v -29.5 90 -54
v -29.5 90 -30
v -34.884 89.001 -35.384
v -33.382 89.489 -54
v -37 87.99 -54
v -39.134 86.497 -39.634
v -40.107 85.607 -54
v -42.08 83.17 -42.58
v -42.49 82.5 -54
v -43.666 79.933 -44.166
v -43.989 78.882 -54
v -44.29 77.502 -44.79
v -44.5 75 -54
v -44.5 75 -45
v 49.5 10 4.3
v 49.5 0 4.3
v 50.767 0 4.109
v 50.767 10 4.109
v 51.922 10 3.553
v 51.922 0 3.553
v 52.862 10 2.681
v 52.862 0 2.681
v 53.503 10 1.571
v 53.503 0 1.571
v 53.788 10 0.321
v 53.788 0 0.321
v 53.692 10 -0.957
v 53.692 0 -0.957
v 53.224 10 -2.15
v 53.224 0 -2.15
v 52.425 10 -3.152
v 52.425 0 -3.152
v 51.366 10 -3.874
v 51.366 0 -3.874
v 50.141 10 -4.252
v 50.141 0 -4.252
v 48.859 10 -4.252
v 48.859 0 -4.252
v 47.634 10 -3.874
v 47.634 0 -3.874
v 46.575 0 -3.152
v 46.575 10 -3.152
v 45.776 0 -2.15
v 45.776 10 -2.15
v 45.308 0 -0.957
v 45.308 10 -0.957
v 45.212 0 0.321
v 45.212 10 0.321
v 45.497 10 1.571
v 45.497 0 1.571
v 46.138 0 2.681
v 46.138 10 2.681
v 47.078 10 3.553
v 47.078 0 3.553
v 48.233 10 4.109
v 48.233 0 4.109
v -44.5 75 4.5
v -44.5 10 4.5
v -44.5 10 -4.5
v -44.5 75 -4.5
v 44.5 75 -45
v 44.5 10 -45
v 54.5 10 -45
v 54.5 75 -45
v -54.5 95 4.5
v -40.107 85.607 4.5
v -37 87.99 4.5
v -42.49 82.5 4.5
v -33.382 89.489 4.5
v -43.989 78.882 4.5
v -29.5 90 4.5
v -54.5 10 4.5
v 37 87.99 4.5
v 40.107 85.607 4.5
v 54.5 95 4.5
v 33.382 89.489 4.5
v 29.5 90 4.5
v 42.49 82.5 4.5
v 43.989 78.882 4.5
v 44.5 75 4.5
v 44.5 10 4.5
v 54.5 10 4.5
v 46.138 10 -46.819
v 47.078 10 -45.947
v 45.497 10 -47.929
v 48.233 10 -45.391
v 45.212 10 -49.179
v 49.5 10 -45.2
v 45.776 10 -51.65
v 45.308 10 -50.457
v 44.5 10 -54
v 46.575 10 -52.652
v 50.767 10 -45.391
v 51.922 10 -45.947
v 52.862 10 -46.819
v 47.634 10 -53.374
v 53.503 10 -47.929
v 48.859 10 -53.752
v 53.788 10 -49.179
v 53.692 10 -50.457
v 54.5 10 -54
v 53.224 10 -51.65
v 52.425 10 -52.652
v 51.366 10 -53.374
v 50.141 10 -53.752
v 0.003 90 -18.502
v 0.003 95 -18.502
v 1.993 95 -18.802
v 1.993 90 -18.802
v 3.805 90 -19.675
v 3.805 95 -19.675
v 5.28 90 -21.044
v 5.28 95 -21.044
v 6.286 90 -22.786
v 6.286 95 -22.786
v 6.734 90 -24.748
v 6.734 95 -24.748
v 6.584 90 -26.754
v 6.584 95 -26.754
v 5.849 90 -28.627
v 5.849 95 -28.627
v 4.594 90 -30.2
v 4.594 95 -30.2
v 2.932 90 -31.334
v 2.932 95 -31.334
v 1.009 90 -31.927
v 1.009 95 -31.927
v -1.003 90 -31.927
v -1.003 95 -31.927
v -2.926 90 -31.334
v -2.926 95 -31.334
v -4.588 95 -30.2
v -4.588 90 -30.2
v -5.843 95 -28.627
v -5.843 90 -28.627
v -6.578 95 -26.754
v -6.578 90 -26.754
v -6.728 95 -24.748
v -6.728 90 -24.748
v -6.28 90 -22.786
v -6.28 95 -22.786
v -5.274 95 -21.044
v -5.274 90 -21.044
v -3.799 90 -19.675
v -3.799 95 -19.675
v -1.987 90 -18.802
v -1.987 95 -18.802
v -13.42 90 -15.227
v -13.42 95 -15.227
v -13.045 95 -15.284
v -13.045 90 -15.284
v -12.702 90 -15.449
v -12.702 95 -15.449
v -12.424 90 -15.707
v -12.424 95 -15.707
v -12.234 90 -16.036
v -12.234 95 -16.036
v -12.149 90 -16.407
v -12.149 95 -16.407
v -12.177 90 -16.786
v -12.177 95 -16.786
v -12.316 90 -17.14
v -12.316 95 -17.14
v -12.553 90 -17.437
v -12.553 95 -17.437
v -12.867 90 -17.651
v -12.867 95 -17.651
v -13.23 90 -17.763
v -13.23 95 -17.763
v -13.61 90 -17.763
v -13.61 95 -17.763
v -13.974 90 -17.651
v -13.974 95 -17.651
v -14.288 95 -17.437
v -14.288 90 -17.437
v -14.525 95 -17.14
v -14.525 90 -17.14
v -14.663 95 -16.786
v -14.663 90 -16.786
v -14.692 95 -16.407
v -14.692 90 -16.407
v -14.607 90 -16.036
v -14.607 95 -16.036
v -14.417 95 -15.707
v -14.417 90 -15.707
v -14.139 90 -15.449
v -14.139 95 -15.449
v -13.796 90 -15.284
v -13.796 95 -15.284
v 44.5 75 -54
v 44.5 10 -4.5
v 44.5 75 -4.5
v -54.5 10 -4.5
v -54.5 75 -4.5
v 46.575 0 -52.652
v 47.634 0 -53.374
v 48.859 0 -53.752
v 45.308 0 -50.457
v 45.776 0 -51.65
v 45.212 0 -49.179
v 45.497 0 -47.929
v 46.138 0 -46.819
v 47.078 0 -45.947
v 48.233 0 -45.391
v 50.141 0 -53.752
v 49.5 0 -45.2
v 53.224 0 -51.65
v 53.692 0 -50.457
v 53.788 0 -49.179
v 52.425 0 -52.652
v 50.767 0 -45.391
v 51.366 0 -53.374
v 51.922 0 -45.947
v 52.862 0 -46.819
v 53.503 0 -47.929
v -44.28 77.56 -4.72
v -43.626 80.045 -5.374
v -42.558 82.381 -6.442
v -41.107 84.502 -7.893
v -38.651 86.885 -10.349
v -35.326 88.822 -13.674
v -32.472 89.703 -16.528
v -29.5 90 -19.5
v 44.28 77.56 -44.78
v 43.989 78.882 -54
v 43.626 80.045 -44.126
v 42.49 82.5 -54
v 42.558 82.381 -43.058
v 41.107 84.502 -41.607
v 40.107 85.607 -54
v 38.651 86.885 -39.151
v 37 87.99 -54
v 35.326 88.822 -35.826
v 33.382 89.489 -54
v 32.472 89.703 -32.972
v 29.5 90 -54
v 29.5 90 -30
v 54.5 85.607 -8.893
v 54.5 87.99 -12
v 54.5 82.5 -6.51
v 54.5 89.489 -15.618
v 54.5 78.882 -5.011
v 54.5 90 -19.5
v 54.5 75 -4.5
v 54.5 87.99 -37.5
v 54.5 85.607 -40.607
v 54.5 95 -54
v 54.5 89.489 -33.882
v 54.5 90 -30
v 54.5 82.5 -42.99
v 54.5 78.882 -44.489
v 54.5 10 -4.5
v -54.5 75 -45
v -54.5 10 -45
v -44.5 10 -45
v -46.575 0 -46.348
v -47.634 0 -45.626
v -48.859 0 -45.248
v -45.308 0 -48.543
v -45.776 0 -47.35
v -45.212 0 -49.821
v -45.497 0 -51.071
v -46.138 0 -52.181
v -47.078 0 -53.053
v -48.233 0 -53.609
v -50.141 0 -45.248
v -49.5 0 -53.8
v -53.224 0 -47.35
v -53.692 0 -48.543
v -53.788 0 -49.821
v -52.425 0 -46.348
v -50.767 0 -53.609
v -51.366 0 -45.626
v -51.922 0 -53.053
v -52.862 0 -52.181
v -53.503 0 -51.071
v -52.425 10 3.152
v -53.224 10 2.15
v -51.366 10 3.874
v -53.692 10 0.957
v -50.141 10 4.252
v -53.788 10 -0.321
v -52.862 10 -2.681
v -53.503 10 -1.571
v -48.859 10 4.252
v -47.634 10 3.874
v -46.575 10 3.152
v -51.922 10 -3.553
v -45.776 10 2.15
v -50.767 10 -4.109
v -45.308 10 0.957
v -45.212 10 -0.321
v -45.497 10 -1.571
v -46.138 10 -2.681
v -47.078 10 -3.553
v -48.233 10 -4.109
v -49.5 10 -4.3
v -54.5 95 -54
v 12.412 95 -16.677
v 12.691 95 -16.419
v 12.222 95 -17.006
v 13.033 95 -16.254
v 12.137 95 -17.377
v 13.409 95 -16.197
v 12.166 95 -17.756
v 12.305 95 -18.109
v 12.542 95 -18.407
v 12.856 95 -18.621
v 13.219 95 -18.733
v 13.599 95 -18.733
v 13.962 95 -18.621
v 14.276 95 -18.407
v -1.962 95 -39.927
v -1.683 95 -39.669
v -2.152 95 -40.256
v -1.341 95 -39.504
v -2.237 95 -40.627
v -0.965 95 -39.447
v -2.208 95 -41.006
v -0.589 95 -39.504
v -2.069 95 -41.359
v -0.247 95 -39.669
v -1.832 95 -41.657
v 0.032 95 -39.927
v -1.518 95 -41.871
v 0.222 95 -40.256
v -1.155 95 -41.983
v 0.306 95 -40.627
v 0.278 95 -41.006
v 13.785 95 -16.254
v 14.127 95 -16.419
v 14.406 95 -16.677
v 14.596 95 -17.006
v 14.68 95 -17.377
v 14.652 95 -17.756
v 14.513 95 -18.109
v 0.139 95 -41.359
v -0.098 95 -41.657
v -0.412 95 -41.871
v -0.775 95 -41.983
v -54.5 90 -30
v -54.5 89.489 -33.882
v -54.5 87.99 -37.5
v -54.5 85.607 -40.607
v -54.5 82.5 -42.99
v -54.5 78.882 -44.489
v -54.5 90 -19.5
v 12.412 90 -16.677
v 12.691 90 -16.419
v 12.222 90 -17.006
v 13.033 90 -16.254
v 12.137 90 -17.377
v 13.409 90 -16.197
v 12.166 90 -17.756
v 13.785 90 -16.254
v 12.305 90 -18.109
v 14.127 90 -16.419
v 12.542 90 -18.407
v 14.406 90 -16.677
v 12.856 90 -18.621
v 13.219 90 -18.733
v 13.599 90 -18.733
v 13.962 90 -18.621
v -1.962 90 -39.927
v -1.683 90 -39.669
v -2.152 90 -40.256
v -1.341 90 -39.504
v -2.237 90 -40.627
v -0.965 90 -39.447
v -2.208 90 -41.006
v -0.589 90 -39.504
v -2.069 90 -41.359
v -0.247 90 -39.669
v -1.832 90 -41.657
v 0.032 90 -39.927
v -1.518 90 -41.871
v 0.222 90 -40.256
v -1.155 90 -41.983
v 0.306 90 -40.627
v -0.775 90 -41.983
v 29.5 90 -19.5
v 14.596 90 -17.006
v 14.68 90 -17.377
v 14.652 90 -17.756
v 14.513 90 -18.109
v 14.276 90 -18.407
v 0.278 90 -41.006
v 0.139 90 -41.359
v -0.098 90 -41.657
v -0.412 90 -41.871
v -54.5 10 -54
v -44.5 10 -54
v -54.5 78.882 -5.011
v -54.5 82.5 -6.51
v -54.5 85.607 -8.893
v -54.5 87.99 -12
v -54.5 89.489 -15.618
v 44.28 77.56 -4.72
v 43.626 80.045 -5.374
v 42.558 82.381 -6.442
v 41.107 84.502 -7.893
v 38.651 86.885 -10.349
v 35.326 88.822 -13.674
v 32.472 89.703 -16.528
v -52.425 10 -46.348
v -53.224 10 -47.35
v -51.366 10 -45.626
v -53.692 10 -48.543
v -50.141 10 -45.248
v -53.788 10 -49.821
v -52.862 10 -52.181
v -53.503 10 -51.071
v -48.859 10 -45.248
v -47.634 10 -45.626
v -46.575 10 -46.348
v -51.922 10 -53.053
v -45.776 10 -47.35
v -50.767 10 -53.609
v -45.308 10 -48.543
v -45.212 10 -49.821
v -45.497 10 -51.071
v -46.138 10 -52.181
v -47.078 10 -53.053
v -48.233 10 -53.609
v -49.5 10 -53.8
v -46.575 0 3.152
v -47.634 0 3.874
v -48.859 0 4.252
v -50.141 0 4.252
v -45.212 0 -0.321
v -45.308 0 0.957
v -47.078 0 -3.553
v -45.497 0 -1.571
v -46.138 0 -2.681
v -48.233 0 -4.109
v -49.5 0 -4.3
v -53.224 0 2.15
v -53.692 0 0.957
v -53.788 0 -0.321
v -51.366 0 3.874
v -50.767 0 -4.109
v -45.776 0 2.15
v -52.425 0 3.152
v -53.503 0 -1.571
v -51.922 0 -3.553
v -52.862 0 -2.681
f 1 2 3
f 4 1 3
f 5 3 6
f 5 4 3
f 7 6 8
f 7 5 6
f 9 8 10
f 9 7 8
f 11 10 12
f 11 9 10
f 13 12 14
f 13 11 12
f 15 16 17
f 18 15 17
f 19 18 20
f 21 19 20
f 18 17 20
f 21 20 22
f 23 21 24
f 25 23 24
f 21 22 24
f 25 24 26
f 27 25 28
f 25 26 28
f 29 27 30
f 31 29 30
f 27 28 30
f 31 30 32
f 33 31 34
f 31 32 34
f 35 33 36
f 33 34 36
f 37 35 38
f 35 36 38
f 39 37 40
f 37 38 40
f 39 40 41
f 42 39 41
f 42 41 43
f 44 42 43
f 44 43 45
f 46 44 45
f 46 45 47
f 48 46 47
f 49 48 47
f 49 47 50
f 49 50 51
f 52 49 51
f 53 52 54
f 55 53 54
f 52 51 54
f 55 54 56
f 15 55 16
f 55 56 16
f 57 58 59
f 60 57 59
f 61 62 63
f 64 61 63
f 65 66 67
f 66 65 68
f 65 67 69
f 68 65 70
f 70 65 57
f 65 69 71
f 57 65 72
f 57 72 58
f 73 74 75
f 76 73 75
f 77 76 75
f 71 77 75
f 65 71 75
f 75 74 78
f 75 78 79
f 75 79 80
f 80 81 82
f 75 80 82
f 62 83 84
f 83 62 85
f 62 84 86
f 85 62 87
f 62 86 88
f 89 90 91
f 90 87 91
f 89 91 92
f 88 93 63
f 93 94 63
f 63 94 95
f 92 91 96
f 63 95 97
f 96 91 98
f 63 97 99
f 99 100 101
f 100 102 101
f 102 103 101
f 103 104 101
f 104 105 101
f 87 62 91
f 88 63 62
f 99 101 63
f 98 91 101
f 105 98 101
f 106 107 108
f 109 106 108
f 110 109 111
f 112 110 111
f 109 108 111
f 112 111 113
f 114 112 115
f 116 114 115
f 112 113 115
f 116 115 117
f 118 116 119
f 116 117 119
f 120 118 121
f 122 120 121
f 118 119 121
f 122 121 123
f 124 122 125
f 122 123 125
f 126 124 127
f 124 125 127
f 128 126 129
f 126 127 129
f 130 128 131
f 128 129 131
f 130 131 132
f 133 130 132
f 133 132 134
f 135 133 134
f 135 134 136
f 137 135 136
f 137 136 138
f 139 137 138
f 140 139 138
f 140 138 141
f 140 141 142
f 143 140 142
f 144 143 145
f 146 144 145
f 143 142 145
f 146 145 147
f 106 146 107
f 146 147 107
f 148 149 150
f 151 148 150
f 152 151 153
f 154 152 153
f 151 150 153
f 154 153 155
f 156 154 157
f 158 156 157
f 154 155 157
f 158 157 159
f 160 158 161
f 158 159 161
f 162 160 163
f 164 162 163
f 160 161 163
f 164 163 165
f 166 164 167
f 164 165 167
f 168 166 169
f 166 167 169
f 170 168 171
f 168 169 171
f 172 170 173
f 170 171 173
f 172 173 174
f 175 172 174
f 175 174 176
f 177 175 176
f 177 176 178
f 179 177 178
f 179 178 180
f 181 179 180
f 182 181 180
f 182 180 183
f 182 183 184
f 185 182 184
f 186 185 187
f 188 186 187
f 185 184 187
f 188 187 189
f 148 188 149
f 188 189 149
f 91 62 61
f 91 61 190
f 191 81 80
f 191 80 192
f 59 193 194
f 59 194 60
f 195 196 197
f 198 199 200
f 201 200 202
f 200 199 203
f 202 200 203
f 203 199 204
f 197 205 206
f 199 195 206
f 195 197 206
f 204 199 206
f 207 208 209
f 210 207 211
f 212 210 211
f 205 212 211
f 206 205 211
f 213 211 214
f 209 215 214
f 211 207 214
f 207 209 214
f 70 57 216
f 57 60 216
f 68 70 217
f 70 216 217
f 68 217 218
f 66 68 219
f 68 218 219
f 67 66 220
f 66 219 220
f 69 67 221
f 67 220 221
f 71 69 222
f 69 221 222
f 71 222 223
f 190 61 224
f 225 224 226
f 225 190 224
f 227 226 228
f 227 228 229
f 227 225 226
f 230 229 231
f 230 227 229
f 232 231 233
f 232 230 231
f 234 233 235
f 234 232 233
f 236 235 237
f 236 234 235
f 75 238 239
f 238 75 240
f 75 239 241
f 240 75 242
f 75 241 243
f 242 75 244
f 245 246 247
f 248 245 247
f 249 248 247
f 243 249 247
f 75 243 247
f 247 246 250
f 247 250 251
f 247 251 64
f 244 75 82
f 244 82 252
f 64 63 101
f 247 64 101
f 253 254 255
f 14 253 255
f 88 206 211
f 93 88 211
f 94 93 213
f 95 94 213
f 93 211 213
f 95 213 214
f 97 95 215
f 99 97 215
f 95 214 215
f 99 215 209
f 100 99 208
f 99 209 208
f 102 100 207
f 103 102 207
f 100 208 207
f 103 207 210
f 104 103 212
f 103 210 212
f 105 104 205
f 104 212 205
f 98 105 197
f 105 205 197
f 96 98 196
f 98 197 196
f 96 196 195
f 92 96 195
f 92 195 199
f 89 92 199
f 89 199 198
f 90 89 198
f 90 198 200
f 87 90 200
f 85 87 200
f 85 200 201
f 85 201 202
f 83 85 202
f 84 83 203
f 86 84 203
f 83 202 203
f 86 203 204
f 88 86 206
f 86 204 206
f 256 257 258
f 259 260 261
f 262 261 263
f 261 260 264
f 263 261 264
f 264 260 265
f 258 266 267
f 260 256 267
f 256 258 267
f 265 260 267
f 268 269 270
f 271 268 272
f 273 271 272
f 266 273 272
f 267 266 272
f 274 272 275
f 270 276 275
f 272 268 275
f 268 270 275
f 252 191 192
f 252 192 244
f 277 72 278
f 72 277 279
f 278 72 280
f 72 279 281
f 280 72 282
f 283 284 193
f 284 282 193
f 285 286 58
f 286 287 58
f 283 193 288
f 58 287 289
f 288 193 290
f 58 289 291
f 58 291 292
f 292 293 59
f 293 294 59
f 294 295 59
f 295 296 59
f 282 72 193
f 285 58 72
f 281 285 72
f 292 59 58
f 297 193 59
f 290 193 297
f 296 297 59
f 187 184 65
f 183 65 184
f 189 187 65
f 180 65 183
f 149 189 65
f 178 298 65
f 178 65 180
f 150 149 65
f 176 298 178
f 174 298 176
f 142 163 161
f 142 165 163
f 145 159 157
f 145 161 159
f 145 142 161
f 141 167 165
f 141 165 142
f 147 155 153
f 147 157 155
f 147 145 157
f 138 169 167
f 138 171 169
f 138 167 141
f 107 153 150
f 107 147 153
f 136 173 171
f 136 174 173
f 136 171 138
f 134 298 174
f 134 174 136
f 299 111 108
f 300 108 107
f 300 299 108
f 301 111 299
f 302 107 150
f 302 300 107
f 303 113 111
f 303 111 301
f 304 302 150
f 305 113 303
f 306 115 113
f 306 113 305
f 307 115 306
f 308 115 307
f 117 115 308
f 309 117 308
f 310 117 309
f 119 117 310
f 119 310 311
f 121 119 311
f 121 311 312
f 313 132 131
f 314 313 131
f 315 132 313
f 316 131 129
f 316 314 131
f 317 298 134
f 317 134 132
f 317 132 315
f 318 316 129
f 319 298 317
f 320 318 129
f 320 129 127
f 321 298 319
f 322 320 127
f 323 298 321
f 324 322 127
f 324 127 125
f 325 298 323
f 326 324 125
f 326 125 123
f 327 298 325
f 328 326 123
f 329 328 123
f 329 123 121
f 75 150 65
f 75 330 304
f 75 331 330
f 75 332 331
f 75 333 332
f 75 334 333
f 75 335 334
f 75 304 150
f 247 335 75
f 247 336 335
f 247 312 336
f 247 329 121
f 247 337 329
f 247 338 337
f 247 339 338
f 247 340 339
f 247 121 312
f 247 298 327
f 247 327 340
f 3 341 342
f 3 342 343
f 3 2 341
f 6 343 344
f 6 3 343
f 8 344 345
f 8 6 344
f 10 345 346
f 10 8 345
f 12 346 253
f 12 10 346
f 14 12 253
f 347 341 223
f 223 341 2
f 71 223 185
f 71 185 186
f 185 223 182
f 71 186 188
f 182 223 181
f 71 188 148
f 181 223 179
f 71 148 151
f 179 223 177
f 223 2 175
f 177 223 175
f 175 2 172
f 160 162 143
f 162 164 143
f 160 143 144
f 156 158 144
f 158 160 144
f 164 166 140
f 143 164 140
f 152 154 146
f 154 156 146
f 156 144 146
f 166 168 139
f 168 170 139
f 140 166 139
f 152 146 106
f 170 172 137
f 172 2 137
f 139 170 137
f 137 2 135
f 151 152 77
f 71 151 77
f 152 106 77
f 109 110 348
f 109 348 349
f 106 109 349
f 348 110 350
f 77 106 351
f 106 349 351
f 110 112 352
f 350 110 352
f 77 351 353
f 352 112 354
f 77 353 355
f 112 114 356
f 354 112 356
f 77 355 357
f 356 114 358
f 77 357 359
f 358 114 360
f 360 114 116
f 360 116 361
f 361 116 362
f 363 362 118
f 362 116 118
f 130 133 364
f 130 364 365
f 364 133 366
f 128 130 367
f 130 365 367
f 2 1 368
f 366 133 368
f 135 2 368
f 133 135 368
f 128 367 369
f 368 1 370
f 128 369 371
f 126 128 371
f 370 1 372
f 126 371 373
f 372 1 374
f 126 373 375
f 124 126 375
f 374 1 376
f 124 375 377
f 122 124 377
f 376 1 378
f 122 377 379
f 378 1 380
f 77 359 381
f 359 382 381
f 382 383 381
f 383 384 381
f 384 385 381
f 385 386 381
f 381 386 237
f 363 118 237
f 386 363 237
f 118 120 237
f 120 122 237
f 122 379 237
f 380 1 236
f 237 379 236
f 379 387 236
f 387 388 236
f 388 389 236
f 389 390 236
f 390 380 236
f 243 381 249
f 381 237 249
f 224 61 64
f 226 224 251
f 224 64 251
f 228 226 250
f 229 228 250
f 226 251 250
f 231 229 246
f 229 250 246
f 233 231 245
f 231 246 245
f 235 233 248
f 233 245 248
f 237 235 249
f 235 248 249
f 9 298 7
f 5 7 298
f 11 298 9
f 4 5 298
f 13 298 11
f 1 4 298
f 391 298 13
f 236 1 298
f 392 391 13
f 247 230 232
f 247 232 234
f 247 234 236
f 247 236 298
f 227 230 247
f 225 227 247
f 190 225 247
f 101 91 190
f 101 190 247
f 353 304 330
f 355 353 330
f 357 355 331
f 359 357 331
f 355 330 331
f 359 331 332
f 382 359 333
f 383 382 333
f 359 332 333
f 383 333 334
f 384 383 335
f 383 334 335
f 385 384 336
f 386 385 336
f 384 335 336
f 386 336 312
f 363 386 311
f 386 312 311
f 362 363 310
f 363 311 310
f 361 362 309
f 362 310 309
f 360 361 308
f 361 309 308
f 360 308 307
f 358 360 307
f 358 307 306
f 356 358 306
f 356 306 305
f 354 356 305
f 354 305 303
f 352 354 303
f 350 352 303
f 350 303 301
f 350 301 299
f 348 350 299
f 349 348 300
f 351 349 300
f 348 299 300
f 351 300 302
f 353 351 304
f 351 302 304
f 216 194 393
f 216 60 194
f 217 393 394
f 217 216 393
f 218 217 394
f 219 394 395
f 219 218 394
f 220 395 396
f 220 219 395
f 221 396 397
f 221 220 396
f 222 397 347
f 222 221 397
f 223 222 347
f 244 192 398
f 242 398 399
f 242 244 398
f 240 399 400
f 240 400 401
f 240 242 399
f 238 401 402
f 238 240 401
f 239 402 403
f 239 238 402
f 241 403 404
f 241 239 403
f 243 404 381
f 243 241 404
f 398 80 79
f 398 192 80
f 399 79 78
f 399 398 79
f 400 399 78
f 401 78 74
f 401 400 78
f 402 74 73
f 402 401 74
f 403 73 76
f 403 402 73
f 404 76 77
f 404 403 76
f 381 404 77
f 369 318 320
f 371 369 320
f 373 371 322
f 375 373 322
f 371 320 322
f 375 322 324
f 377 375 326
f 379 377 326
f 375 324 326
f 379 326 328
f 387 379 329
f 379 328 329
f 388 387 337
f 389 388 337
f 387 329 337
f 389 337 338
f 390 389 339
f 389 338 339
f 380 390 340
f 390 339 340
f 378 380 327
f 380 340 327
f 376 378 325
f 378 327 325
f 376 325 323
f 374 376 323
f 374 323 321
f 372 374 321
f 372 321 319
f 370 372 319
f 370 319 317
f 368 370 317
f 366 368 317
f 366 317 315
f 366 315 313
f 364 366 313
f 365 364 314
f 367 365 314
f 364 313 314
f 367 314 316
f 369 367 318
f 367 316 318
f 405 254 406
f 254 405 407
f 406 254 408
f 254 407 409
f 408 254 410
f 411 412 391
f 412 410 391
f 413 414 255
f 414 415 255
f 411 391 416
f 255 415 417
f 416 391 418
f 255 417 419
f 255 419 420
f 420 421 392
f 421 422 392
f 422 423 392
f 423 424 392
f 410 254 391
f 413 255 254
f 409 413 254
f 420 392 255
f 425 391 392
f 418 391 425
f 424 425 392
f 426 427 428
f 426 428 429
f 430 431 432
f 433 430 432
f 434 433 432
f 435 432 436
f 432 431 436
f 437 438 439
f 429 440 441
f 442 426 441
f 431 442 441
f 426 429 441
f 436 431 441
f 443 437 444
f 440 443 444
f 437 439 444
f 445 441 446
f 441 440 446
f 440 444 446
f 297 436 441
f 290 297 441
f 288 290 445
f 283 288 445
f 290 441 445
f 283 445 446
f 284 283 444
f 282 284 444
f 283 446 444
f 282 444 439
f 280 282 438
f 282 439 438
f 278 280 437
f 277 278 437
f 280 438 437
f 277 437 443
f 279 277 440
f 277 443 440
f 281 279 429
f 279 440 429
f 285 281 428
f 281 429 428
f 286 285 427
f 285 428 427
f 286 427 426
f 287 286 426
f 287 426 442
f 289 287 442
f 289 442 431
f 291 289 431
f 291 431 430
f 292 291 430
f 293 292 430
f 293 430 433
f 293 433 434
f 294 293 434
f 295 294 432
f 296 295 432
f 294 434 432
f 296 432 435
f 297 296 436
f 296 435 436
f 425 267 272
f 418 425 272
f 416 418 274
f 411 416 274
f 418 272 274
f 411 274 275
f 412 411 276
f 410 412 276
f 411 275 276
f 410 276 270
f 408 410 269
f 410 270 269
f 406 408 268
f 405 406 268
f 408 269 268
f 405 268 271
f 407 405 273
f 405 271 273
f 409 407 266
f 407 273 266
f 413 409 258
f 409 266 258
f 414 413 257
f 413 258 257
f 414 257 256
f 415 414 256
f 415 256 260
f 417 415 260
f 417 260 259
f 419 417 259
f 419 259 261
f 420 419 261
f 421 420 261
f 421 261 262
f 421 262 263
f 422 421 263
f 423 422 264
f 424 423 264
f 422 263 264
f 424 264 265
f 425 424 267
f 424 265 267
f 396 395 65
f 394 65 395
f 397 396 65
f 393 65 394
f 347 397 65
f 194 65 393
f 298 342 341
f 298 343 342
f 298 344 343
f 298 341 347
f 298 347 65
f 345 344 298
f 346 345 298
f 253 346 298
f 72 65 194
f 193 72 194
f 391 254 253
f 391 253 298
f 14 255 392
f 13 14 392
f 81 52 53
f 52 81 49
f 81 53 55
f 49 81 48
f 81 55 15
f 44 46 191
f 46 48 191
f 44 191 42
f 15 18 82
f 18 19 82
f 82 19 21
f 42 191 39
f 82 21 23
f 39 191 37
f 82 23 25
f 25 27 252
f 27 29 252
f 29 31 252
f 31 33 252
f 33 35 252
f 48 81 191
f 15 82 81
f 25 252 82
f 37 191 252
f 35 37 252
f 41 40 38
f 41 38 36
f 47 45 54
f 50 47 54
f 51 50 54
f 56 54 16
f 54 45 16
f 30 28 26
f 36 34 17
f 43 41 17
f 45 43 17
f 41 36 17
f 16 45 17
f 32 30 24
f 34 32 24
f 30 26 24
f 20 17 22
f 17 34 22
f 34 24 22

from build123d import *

# Parameters (mm, degrees)
SKETCH1_R             = 4.3
BOSS_EXTRUDE1_DEPTH   = 10
BOSS_EXTRUDE1_2_DEPTH = 10
BOSS_EXTRUDE1_3_DEPTH = 10
BOSS_EXTRUDE1_4_DEPTH = 10
SKETCH2_W             = 10
SKETCH2_H             = 9
BOSS_EXTRUDE2_DEPTH   = 80
SKETCH3_W             = 109
SKETCH3_H             = 58.5
BOSS_EXTRUDE3_DEPTH   = 5
FILLET1_R             = 15
SKETCH4_R             = 1.275
SKETCH4_R_2           = 6.75
CUT_EXTRUDE1_DEPTH    = 5


with BuildPart() as part:
    # Sketch1 → Boss-Extrude1 (new body)
    with BuildSketch(Plane(origin=(0, 0, 0), x_dir=(1, 0, 0), z_dir=(0, 1, 0))):
        with Locations(Location((49.5, 0, 0), (0, 0, 270))):
            Circle(SKETCH1_R)
    extrude(amount=BOSS_EXTRUDE1_DEPTH)



with BuildPart() as body_2:
    # Sketch1 → Boss-Extrude1 2 (new body)
    with BuildSketch(Plane(origin=(0, 0, 0), x_dir=(1, 0, 0), z_dir=(0, 1, 0))):
        with Locations(Location((-49.5, 0, 0), (0, 0, 90))):
            Circle(SKETCH1_R)
    extrude(amount=BOSS_EXTRUDE1_2_DEPTH)


with BuildPart() as body_3:
    # Sketch1 → Boss-Extrude1 3 (new body)
    with BuildSketch(Plane(origin=(0, 0, 0), x_dir=(1, 0, 0), z_dir=(0, 1, 0))):
        with Locations(Location((49.5, 49.5, 0), (0, 0, 270))):
            Circle(SKETCH1_R)
    extrude(amount=BOSS_EXTRUDE1_3_DEPTH)


with BuildPart() as body_4:
    # Sketch1 → Boss-Extrude1 4 (new body)
    with BuildSketch(Plane(origin=(0, 0, 0), x_dir=(1, 0, 0), z_dir=(0, 1, 0))):
        with Locations(Location((-49.5, 49.5, 0), (0, 0, 90))):
            Circle(SKETCH1_R)
    extrude(amount=BOSS_EXTRUDE1_4_DEPTH)


with BuildPart() as part_1:
    add(part.part)

    add(body_2.part)  # Boss-Extrude2 merges body 2

    add(body_3.part)  # Boss-Extrude2 merges body 3

    add(body_4.part)  # Boss-Extrude2 merges body 4
    # Sketch2 → Boss-Extrude2 (add)
    with BuildSketch(Plane(origin=(0, 10, 0), x_dir=(1, 0, 0), z_dir=(0, 1, 0))):
        with Locations((49.5, 0)):
            Rectangle(SKETCH2_W, SKETCH2_H)
        with Locations((-49.5, 0)):
            Rectangle(SKETCH2_W, SKETCH2_H)
        with Locations((49.5, 49.5)):
            Rectangle(SKETCH2_W, SKETCH2_H)
        with Locations((-49.5, 49.5)):
            Rectangle(SKETCH2_W, SKETCH2_H)
    extrude(amount=BOSS_EXTRUDE2_DEPTH)

    # Sketch3 → Boss-Extrude3 (add)
    with BuildSketch(Plane(origin=(0, 90, 0), x_dir=(1, 0, 0), z_dir=(0, 1, 0))):
        with Locations((0, 24.75)):
            Rectangle(SKETCH3_W, SKETCH3_H)
    extrude(amount=BOSS_EXTRUDE3_DEPTH)

    # Fillet1
    fillet1_edges = [part_1.edges().sort_by_distance(p)[0] for p in [
        (49.5, 90, -4.5),
        (44.5, 90, 0),
        (-44.5, 90, 0),
        (-49.5, 90, -4.5),
        (44.5, 90, -49.5),
        (49.5, 90, -45),
        (-44.5, 90, -49.5),
        (-49.5, 90, -45),
    ]]
    fillet(fillet1_edges, radius=FILLET1_R)

    # Sketch4 → Cut-Extrude1 (cut)
    with BuildSketch(Plane(origin=(0, 95, 0), x_dir=(1, 0, 0), z_dir=(0, 1, 0))):
        with Locations(Location((-0.965131435, 40.72196281, 0), (0, 0, 270))):
            Circle(SKETCH4_R)
        with Locations(Location((13.408900265, 17.47196281, 0), (0, 0, 270))):
            Circle(SKETCH4_R)
        with Locations(Location((-13.420367633, 16.50222878, 0), (0, 0, 270))):
            Circle(SKETCH4_R)
        with Locations(Location((0.003026126, 25.25222878, 0), (0, 0, 270))):
            Circle(SKETCH4_R_2)
    extrude(amount=-CUT_EXTRUDE1_DEPTH, mode=Mode.SUBTRACT)


solid = part_1.part
